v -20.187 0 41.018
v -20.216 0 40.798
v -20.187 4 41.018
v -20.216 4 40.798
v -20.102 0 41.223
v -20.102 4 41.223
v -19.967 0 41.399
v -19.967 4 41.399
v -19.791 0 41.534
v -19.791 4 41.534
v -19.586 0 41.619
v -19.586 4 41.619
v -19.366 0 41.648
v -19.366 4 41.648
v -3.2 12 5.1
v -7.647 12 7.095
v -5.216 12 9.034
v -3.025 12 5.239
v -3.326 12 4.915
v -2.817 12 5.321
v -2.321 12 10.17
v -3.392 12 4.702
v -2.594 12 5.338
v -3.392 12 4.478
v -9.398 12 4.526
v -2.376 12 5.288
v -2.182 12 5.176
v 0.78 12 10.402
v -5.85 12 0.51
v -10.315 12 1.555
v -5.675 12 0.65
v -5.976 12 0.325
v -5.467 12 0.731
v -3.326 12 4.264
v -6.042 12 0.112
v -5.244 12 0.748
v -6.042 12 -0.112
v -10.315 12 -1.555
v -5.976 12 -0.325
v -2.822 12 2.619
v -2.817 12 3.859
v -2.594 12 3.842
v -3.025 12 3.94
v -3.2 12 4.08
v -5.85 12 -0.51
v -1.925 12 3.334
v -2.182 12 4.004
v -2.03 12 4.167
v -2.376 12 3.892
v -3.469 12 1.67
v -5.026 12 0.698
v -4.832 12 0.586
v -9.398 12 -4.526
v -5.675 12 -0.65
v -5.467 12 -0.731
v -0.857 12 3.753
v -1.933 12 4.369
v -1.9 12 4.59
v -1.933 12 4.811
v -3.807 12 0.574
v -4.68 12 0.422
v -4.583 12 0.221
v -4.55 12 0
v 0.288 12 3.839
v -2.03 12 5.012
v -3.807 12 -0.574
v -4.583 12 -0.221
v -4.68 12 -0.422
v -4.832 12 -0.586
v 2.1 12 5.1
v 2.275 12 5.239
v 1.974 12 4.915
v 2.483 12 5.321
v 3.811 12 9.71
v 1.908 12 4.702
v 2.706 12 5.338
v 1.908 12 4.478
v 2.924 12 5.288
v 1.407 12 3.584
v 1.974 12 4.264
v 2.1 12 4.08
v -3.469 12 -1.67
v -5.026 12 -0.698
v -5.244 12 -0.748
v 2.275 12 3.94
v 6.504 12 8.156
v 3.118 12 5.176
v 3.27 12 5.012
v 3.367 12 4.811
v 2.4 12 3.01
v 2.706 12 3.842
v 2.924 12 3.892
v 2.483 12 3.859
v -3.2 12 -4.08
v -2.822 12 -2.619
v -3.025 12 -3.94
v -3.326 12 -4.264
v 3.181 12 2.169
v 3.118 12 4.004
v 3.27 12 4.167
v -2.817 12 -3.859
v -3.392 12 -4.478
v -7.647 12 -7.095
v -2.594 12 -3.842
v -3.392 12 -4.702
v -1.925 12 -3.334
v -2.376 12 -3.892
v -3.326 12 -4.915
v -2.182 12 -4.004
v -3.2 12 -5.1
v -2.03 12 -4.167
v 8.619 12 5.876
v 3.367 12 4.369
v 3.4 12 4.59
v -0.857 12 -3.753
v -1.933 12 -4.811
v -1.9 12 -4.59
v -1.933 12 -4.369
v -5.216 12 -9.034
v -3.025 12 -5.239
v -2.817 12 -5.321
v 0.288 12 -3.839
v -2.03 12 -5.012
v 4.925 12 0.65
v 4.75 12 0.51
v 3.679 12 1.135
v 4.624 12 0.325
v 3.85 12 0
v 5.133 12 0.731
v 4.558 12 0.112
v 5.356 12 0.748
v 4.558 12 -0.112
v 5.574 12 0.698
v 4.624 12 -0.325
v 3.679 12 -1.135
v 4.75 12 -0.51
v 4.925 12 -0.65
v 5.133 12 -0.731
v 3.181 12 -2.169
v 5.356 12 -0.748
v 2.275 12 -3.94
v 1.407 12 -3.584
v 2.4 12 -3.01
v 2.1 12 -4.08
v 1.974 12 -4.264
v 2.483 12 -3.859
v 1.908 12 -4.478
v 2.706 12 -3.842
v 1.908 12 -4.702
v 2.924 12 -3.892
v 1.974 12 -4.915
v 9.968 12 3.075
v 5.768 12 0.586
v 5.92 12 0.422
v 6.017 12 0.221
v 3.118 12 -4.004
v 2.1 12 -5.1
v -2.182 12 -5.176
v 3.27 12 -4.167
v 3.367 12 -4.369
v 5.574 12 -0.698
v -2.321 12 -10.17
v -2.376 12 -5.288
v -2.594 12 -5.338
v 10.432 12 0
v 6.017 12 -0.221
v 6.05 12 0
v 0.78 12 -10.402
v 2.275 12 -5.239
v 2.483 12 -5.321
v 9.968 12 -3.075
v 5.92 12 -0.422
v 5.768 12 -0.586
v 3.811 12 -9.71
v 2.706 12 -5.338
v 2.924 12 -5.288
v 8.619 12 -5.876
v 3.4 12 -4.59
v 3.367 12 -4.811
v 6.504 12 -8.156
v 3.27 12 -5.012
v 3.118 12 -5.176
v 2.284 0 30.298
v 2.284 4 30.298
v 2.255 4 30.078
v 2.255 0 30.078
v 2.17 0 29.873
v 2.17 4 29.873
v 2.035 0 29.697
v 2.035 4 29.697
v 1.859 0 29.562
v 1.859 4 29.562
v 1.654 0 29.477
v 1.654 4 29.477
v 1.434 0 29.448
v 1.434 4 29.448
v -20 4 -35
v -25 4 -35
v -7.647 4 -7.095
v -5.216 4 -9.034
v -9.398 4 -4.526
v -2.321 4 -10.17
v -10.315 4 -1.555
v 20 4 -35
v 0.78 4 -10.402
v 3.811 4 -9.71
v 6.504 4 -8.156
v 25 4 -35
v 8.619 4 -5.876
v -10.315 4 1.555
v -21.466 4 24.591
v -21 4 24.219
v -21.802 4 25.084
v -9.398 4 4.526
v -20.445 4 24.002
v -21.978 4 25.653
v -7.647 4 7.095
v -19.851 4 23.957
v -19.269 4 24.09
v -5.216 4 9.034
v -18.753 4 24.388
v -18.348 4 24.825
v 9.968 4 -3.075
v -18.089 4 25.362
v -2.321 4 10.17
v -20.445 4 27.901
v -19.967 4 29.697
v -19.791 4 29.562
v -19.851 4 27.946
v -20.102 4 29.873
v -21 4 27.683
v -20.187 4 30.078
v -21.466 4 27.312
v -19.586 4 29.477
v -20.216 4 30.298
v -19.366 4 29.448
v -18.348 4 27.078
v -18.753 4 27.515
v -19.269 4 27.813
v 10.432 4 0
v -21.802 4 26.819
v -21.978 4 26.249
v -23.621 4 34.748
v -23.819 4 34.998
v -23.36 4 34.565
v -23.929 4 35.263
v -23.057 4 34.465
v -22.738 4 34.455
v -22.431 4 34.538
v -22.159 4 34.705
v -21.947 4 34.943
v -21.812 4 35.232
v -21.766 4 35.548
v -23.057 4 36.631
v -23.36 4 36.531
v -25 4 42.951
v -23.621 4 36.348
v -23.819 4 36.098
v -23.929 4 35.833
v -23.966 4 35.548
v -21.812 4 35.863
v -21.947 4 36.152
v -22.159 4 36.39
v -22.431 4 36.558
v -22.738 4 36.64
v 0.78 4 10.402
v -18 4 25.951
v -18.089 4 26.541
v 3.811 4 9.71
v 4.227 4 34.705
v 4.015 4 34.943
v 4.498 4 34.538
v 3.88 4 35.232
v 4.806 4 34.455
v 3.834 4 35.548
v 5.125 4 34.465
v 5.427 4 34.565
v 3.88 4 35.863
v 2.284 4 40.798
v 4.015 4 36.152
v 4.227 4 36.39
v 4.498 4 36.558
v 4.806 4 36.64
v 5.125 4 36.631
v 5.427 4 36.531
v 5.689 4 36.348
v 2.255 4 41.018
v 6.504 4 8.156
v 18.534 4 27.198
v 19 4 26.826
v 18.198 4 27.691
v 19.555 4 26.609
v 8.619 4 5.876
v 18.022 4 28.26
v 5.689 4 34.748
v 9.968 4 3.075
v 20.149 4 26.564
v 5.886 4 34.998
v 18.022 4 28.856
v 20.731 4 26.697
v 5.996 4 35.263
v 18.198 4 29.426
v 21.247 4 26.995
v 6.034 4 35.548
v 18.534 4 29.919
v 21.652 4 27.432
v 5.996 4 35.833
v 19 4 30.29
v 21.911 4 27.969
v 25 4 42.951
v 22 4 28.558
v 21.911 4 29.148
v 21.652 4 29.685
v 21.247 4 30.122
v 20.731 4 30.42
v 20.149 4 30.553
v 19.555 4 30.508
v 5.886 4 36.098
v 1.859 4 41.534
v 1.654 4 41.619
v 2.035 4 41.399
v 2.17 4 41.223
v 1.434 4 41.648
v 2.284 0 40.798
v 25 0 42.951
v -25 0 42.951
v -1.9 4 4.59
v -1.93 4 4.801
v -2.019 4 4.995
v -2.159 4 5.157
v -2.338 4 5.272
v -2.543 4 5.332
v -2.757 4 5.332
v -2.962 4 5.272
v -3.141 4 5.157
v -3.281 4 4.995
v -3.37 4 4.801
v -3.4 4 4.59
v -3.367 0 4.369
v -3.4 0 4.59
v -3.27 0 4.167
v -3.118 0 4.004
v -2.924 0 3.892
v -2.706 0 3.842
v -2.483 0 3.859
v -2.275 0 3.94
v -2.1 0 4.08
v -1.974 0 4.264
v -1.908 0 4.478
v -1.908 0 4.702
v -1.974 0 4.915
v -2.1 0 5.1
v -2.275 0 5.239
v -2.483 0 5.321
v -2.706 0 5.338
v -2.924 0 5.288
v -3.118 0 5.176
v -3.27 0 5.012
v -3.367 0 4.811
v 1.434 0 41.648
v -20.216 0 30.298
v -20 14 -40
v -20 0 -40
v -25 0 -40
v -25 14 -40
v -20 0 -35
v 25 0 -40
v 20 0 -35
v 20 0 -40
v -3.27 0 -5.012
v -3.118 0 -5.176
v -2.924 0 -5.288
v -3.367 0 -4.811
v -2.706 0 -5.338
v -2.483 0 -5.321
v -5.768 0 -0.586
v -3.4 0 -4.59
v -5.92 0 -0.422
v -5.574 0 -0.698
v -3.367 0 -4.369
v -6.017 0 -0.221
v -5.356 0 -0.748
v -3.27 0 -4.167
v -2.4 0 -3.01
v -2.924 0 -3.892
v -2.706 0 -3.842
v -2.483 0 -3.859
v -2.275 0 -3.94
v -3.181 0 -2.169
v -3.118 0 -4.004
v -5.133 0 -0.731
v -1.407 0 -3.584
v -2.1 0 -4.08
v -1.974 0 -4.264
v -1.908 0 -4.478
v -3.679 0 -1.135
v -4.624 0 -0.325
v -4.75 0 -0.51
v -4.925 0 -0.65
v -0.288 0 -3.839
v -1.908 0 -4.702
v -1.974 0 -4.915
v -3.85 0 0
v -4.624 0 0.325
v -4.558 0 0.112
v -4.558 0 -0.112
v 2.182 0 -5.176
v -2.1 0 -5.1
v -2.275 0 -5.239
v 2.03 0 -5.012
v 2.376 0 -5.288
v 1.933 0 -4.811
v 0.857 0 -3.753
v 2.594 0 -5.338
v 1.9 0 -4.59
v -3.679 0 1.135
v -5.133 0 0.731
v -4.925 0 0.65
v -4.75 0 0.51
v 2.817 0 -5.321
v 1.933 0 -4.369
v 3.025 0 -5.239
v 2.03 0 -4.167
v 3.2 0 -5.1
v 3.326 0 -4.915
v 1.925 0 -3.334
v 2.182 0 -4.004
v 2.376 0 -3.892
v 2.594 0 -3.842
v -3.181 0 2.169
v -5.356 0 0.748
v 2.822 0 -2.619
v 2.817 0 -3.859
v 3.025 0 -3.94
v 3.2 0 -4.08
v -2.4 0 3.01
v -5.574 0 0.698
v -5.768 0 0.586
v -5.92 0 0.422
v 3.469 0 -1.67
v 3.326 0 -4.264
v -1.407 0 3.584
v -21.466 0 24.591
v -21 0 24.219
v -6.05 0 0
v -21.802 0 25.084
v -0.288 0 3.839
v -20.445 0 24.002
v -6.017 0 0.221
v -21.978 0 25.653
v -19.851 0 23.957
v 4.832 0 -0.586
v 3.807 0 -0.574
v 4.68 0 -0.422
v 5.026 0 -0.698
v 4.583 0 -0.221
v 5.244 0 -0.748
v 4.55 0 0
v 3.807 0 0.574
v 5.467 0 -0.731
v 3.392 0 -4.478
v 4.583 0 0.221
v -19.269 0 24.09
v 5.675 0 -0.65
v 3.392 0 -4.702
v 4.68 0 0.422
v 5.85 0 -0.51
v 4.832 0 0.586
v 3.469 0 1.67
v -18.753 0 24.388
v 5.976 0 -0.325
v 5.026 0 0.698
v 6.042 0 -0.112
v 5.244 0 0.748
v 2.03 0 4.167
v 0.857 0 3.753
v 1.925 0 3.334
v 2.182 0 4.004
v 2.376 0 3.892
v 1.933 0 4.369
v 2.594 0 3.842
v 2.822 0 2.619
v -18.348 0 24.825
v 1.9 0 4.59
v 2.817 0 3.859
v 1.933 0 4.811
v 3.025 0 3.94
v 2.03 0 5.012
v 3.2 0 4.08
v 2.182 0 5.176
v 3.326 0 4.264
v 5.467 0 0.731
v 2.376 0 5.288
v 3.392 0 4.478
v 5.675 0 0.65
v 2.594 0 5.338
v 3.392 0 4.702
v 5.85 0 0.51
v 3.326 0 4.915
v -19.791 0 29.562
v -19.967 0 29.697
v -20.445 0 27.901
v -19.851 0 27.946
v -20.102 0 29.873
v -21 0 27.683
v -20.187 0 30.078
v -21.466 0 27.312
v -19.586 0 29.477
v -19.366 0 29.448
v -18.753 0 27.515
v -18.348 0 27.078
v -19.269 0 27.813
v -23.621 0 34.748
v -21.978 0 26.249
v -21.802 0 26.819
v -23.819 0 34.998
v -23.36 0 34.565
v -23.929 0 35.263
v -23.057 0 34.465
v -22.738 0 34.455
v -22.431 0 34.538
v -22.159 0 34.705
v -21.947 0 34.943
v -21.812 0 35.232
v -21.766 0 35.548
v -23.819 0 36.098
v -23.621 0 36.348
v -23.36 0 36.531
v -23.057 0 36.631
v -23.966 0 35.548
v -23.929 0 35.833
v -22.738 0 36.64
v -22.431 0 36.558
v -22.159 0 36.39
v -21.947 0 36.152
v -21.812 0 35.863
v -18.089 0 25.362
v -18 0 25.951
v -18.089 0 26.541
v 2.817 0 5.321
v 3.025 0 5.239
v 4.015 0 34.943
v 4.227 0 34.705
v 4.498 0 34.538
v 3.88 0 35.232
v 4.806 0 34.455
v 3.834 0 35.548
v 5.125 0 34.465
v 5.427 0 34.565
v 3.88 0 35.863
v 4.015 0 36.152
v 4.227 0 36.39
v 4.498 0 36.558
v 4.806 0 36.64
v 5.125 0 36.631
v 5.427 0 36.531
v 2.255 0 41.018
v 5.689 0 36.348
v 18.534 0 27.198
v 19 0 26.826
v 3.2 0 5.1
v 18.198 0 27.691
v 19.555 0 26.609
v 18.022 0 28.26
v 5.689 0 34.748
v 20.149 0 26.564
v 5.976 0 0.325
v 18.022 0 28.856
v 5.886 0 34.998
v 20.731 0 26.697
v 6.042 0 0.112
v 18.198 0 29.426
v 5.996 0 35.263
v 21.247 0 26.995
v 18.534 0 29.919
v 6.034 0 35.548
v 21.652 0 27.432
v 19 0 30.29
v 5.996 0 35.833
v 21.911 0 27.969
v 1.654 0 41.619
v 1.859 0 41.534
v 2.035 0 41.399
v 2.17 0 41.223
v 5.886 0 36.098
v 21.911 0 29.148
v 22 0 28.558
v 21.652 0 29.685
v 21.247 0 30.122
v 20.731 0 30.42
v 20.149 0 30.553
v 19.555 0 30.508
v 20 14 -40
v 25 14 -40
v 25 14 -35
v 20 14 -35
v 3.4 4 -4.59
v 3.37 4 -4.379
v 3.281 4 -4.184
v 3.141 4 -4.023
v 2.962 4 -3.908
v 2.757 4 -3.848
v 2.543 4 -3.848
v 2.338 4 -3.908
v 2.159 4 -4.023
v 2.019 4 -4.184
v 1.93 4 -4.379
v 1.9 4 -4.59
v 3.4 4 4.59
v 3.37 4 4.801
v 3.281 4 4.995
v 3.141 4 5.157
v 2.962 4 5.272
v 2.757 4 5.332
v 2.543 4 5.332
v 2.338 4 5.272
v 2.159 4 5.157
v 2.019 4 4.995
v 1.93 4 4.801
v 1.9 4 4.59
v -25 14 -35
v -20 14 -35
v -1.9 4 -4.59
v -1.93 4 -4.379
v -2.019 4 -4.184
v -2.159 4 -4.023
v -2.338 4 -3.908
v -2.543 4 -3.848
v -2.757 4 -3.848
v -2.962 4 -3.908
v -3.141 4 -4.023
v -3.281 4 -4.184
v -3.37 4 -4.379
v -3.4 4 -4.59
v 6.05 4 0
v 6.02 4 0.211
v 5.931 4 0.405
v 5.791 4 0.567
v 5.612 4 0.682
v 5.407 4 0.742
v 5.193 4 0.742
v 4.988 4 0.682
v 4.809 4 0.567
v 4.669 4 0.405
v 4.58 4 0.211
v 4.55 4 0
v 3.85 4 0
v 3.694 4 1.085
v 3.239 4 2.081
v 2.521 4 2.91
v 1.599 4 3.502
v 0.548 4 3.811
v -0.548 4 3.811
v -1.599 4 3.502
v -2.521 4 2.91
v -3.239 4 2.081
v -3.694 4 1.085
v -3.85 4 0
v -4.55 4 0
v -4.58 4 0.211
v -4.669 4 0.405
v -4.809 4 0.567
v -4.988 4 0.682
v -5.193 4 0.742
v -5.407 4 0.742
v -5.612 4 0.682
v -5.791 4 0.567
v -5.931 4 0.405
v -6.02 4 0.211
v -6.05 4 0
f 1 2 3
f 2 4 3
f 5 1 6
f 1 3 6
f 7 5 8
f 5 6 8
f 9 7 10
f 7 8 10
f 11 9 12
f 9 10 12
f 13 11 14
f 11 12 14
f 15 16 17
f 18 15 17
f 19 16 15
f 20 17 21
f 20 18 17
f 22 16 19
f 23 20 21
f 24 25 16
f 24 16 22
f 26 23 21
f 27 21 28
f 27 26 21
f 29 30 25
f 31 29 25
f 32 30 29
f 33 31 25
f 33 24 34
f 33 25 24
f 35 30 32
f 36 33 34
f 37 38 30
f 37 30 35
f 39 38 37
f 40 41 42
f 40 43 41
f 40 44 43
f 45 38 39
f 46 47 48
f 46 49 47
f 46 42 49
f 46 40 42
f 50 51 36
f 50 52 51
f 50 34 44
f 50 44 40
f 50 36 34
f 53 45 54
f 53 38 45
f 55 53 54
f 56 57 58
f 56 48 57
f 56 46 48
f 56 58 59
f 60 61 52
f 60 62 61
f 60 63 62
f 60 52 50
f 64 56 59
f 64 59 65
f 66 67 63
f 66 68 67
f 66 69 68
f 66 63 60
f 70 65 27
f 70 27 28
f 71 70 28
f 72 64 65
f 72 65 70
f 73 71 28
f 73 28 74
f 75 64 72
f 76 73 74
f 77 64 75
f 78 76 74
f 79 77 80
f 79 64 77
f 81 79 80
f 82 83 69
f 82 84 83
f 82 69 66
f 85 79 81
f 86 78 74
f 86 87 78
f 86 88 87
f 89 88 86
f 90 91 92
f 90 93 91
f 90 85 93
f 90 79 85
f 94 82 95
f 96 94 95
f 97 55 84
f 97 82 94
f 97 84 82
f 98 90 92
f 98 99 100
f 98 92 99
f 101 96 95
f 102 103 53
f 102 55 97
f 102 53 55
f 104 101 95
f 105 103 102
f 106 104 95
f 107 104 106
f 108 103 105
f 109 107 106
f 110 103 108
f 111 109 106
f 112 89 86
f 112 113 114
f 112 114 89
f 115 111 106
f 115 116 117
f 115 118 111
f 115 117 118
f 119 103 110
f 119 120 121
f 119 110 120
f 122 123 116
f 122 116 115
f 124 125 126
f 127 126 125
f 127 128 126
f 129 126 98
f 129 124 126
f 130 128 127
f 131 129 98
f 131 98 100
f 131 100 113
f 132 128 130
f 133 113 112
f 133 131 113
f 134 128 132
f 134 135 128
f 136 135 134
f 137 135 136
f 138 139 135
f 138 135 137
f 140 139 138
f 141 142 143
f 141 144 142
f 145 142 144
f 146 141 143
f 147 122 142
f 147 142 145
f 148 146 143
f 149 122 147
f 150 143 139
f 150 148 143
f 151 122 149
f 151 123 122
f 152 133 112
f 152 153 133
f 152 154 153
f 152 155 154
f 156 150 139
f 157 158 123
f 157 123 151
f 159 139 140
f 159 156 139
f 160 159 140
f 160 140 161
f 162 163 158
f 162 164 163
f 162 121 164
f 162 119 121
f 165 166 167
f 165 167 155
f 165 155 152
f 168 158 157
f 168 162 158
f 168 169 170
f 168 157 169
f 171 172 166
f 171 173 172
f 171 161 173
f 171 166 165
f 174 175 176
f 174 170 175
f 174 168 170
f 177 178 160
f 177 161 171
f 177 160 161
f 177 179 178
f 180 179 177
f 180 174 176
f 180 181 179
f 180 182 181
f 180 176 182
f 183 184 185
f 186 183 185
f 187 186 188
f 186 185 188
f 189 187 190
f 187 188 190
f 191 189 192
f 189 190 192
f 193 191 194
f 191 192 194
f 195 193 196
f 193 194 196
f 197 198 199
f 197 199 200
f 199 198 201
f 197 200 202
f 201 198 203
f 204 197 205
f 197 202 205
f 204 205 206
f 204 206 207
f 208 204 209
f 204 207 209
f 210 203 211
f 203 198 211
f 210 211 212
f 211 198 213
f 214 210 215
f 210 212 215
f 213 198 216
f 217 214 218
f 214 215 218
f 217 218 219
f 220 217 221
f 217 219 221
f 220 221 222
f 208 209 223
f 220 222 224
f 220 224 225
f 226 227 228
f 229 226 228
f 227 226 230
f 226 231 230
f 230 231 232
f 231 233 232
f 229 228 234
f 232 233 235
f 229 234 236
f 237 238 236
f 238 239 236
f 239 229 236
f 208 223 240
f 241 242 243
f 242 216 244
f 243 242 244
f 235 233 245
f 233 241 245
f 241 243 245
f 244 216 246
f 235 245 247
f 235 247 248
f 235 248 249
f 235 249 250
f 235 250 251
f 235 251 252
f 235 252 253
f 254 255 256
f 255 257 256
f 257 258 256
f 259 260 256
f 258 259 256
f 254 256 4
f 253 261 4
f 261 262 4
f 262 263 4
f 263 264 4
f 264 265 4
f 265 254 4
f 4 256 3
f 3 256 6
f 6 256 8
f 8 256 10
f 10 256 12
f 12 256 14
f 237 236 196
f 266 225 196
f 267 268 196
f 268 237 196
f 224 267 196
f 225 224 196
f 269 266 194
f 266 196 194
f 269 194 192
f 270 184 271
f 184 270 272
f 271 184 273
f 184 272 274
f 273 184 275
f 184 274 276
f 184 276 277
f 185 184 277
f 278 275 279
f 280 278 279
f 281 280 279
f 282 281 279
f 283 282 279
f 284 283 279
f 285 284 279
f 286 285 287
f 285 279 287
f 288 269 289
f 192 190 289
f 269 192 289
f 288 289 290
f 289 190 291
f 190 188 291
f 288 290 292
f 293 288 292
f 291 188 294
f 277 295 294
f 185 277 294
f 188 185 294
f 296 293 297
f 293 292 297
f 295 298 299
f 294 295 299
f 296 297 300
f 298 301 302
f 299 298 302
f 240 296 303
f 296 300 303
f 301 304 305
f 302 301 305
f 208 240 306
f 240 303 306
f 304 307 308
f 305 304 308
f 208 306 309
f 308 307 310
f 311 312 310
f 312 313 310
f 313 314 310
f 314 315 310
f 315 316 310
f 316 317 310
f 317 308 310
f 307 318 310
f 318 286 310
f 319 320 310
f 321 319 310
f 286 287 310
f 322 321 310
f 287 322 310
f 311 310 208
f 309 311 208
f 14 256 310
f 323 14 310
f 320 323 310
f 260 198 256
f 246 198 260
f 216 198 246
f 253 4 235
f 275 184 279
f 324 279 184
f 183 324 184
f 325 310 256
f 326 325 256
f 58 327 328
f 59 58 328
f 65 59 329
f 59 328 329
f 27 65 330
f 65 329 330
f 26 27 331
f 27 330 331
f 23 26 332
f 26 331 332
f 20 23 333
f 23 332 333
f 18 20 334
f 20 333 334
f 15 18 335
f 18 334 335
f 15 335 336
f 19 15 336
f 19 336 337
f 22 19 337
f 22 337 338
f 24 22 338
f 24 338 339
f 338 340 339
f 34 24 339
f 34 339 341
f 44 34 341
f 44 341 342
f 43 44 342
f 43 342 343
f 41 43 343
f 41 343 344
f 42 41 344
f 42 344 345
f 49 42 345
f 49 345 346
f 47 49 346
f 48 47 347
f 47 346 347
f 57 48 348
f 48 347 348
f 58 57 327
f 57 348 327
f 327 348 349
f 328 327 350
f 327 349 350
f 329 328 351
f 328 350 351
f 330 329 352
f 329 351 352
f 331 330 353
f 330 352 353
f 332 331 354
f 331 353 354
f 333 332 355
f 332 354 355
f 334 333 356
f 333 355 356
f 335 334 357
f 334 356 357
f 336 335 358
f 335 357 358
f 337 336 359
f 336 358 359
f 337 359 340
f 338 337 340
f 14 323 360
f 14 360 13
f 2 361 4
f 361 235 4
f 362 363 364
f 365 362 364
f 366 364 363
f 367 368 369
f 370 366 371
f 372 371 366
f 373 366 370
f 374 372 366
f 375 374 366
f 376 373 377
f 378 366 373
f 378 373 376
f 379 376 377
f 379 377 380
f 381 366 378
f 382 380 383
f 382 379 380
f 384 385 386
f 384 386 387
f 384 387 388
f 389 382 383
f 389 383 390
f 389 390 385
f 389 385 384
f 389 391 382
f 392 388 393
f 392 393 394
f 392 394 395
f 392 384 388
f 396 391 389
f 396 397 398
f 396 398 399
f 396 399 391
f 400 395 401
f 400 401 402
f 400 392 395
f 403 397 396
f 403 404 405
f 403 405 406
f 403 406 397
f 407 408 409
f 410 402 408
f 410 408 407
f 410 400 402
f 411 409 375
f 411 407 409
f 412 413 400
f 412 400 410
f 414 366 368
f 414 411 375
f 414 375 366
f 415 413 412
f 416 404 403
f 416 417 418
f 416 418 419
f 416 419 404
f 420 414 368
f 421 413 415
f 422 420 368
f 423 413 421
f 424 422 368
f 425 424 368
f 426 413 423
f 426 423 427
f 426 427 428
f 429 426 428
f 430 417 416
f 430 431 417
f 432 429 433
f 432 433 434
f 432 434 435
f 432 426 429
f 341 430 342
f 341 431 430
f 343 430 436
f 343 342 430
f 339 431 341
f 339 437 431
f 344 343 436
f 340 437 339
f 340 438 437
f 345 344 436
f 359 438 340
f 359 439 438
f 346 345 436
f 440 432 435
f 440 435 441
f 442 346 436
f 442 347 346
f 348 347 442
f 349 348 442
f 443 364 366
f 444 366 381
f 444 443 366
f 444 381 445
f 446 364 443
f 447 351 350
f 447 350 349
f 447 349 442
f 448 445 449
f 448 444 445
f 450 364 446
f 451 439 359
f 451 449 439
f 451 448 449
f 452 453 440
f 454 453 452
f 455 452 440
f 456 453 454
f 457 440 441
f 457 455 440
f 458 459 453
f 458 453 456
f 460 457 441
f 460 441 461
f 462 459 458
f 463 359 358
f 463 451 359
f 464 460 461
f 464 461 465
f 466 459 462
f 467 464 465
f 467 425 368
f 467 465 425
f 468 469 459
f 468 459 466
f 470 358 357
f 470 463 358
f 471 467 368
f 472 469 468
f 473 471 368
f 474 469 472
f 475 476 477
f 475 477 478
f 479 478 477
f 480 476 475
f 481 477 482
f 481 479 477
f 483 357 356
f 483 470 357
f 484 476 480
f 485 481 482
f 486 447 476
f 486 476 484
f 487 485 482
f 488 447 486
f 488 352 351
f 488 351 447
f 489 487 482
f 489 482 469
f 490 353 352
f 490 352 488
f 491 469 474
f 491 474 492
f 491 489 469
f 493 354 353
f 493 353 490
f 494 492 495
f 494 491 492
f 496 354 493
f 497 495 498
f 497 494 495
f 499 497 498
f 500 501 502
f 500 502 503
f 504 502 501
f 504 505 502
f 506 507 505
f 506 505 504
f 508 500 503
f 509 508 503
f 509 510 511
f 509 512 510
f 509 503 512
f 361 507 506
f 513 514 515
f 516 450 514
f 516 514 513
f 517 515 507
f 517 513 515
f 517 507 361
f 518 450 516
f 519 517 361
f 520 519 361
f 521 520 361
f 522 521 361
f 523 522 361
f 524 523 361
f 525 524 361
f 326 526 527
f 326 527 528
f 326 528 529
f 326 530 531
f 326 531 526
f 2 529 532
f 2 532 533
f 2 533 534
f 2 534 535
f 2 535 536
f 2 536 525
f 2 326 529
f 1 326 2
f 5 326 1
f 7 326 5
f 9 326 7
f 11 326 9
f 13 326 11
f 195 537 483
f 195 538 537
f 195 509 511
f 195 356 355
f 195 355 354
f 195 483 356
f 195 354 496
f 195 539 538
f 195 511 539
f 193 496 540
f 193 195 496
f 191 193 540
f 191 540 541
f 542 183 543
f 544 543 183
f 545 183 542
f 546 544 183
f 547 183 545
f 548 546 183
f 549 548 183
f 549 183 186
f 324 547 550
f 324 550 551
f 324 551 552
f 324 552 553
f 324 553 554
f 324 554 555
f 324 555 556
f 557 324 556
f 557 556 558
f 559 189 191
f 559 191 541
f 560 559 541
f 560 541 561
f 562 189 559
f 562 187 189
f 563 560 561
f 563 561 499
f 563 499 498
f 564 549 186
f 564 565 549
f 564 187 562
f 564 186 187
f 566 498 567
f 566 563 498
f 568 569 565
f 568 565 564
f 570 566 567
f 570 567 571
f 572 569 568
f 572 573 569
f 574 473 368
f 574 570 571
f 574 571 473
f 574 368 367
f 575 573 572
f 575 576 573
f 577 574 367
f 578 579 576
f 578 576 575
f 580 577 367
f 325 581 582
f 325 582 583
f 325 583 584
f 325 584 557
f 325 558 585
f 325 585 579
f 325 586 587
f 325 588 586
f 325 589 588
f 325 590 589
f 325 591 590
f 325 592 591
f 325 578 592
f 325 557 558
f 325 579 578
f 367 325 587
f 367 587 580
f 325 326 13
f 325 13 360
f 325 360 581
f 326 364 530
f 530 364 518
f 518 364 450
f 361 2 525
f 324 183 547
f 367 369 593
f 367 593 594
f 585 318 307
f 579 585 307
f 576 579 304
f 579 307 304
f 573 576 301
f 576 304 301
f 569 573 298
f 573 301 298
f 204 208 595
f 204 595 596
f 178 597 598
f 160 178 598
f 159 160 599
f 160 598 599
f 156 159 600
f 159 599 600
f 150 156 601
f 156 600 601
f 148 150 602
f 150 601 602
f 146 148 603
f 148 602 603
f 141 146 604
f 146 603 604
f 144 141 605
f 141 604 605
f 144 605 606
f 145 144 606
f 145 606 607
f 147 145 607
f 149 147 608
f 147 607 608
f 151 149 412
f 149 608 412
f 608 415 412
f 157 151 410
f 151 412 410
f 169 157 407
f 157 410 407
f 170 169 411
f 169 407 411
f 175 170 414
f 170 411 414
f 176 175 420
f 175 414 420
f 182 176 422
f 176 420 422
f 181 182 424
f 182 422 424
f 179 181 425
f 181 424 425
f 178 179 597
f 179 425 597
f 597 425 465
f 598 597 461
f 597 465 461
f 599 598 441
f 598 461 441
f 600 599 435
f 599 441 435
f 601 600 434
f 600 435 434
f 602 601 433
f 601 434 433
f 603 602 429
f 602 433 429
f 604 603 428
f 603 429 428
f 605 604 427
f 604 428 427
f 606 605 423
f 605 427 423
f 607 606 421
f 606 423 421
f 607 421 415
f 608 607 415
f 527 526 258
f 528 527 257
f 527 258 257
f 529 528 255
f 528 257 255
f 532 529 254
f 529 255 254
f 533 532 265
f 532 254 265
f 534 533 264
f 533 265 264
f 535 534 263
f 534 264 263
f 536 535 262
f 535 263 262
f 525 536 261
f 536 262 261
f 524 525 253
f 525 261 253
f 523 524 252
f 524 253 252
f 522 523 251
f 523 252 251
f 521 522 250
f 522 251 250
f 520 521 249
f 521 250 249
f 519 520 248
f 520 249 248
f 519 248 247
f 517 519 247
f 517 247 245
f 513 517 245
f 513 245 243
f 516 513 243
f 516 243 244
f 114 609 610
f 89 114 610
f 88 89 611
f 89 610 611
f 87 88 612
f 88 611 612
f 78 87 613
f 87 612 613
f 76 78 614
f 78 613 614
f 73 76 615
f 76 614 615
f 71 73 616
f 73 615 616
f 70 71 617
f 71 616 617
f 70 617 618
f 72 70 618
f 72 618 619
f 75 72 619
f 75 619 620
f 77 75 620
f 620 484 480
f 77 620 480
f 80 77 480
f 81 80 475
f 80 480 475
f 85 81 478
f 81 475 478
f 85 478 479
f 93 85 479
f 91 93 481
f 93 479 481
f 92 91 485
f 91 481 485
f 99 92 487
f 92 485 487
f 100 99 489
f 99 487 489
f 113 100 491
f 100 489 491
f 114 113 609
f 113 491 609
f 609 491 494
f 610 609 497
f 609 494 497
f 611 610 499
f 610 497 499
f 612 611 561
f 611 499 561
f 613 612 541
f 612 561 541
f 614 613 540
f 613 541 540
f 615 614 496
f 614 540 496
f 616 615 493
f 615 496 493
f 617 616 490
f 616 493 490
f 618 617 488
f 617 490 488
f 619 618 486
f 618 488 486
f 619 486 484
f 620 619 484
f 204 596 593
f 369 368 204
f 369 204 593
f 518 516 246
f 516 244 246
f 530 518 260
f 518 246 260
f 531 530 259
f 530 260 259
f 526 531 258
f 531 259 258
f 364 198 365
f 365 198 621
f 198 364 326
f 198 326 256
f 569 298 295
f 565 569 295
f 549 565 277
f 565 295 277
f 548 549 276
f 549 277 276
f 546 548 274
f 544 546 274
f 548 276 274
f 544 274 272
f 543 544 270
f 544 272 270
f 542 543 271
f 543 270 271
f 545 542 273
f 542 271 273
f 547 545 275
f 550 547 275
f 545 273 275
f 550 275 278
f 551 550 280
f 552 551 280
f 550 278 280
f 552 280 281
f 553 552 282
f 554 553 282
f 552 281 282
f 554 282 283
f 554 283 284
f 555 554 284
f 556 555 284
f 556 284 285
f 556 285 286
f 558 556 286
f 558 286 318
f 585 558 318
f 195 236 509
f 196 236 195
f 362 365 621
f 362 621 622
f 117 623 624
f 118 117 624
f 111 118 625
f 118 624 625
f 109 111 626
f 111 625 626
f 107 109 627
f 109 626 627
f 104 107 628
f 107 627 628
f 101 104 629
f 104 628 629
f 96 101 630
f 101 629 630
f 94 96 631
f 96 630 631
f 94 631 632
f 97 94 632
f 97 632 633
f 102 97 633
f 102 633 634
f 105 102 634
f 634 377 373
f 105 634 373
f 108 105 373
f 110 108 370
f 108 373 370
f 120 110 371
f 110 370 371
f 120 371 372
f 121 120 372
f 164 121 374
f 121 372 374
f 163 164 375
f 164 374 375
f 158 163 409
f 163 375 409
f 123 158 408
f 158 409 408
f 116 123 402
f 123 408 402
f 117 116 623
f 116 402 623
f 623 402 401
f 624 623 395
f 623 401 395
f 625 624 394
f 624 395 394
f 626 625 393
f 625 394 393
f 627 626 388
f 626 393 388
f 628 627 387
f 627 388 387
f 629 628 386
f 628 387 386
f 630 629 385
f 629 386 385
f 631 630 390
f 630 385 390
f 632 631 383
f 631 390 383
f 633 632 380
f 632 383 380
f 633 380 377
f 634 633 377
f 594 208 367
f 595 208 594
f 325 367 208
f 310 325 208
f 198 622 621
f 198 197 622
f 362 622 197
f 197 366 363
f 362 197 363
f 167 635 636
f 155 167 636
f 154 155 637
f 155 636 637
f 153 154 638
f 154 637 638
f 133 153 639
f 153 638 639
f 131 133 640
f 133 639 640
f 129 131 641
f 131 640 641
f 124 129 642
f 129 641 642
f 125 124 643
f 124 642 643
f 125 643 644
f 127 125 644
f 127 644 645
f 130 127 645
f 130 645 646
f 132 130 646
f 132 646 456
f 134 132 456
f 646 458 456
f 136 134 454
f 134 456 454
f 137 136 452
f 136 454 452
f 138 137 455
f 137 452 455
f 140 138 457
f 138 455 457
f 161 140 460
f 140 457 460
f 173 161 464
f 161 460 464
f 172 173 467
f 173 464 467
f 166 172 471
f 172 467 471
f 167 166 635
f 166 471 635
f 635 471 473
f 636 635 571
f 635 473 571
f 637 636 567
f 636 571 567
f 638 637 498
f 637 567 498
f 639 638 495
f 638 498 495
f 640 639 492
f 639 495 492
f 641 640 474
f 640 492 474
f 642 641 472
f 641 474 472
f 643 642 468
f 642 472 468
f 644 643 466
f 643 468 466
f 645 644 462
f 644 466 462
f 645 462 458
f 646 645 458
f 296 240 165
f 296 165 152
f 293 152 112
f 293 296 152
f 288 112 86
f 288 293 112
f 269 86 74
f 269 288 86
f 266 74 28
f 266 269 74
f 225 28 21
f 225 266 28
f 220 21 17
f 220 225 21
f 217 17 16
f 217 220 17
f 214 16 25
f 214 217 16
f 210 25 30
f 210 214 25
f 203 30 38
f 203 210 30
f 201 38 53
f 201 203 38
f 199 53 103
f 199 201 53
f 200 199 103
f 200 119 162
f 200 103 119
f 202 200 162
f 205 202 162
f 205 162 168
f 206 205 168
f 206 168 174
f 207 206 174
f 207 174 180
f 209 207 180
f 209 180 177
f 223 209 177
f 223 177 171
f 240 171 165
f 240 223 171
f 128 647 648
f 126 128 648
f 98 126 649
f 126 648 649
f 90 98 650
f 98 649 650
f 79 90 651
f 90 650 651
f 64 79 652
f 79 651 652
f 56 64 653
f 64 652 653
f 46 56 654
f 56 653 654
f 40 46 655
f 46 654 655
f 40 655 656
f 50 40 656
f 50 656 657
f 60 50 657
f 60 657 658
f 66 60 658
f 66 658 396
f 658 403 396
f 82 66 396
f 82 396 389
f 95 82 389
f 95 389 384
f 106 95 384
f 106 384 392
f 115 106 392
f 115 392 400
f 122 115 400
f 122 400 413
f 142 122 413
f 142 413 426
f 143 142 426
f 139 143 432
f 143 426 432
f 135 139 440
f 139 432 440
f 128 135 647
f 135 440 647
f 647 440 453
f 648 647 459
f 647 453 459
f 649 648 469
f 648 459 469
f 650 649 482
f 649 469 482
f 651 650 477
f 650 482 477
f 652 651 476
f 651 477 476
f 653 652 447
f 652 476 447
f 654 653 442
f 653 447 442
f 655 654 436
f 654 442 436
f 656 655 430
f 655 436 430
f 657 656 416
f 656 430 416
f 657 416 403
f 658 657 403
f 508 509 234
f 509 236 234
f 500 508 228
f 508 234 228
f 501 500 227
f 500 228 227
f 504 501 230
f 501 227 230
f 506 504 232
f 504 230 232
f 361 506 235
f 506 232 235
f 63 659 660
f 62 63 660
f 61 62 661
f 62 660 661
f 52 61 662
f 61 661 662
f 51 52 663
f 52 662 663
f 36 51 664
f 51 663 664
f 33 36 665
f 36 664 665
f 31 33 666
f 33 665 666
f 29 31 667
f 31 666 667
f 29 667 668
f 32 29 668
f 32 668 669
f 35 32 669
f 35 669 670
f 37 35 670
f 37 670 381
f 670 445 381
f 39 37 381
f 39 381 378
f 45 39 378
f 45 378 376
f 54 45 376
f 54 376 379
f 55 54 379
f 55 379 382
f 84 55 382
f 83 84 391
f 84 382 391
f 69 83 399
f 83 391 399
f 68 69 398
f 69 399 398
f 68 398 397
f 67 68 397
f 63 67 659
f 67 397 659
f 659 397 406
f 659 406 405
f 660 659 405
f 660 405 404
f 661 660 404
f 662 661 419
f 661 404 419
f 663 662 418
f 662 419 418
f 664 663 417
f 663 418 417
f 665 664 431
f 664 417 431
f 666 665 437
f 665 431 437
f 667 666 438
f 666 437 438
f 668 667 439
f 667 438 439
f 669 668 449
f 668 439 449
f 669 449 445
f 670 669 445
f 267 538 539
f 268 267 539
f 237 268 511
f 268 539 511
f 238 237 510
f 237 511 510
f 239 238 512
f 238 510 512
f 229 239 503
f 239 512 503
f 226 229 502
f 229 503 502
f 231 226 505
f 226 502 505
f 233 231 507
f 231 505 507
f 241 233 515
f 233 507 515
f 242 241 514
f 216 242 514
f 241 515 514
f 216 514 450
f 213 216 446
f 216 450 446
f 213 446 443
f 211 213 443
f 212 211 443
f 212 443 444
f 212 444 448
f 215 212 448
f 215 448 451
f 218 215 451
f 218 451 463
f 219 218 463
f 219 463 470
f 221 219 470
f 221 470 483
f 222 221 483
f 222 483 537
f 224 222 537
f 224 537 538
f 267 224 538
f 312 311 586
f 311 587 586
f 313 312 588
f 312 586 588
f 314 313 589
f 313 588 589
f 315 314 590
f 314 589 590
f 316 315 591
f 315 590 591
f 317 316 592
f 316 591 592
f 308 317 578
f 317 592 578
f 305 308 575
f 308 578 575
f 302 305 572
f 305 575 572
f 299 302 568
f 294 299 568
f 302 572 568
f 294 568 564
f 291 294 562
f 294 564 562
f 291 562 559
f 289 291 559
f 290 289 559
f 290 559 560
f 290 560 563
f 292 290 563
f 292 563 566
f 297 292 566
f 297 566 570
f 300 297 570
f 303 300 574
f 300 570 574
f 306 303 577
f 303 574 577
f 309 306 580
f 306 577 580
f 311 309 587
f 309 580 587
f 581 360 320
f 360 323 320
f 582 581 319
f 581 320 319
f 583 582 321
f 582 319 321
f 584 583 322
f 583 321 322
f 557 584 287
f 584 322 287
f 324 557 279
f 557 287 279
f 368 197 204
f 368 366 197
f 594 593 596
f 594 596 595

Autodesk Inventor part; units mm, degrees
ref_plane "YZ Plane" through (0, 0, 0) normal (1, 0, 0) x (0, 1, 0)
ref_plane "XZ Plane" through (0, 0, 0) normal (0, 1, 0) x (-1, 0, 0)
ref_plane "XY Plane" through (0, 0, 0) normal (0, 0, 1) x (1, 0, 0)
sketch "Эскиз1" plane through (0, 0, 0) normal (0, 1, 0) x (-1, 0, 0)
  circle A0 centre (-2.65, -4.5899) radius 0.75
  circle A1 centre (2.65, -4.5899) radius 0.75
  circle A2 centre (5.3, 0) radius 0.75
  circle A3 centre (2.65, 4.5899) radius 0.75
  circle A4 centre (-2.65, 4.5899) radius 0.75
  circle A5 centre (-5.3, 0) radius 0.75
  circle A6 centre (0, 0) radius 3.85
  arc A7 (-3.4059, 8.2225) -> (-3.1756, 6.1003) centre (3.6513, 7.9146) ccw
  arc A8 (-3.1756, 6.1003) -> (-3.6952, 5.8003) centre (0, 0) ccw
  arc A9 (-3.6952, 5.8003) -> (-5.418, 7.0608) centre (-8.6799, 0.7952) ccw
  arc A10 (-5.418, 7.0608) -> (-6.0128, 6.5618) centre (0, 0) ccw
  arc A11 (-6.0128, 6.5618) -> (-5.0705, 4.6463) centre (0.7241, 8.6861) ccw
  arc A12 (-5.0705, 4.6463) -> (-5.4562, 4.1867) centre (0, 0) ccw
  arc A13 (-5.4562, 4.1867) -> (-7.5062, 4.782) centre (-8.4284, -2.2214) ccw
  arc A14 (-7.5062, 4.782) -> (-7.8944, 4.1096) centre (0, 0) ccw
  arc A15 (-7.8944, 4.1096) -> (-6.3539, 2.6319) centre (-2.2904, 8.4099) ccw
  arc A16 (-6.3539, 2.6319) -> (-6.5591, 2.0681) centre (0, 0) ccw
  arc A17 (-6.5591, 2.0681) -> (-8.689, 1.9263) centre (-7.1604, -4.9702) ccw
  arc A18 (-8.689, 1.9263) -> (-8.8239, 1.1617) centre (0, 0) ccw
  arc A19 (-8.8239, 1.1617) -> (-6.8708, 0.3) centre (-5.0286, 7.1194) ccw
  arc A20 (-6.8708, 0.3) -> (-6.8708, -0.3) centre (0, 0) ccw
  arc A21 (-6.8708, -0.3) -> (-8.8239, -1.1617) centre (-5.0286, -7.1194) ccw
  arc A22 (-8.8239, -1.1617) -> (-8.689, -1.9263) centre (0, 0) ccw
  arc A23 (-8.689, -1.9263) -> (-6.5591, -2.0681) centre (-7.1604, 4.9702) ccw
  arc A24 (-6.5591, -2.0681) -> (-6.3539, -2.6319) centre (0, 0) ccw
  arc A25 (-6.3539, -2.6319) -> (-7.8944, -4.1096) centre (-2.2904, -8.4099) ccw
  arc A26 (-7.8944, -4.1096) -> (-7.5062, -4.782) centre (0, 0) ccw
  arc A27 (-7.5062, -4.782) -> (-5.4562, -4.1867) centre (-8.4284, 2.2214) ccw
  arc A28 (-5.4562, -4.1867) -> (-5.0705, -4.6463) centre (0, 0) ccw
  arc A29 (-5.0705, -4.6463) -> (-6.0128, -6.5618) centre (0.7241, -8.6861) ccw
  arc A30 (-6.0128, -6.5618) -> (-5.418, -7.0608) centre (0, 0) ccw
  arc A31 (-5.418, -7.0608) -> (-3.6952, -5.8003) centre (-8.6799, -0.7952) ccw
  arc A32 (-3.6952, -5.8003) -> (-3.1756, -6.1003) centre (0, 0) ccw
  arc A33 (-3.1756, -6.1003) -> (-3.4059, -8.2225) centre (3.6513, -7.9146) ccw
  arc A34 (-3.4059, -8.2225) -> (-2.6763, -8.4881) centre (0, 0) ccw
  arc A35 (-2.6763, -8.4881) -> (-1.4885, -6.7144) centre (-7.8845, -3.716) ccw
  arc A36 (-1.4885, -6.7144) -> (-0.8977, -6.8185) centre (0, 0) ccw
  arc A37 (-0.8977, -6.8185) -> (-0.3882, -8.8915) centre (6.138, -6.1885) ccw
  arc A38 (-0.3882, -8.8915) -> (0.3882, -8.8915) centre (0, 0) ccw
  arc A39 (0.3882, -8.8915) -> (0.8977, -6.8185) centre (-6.138, -6.1885) ccw
  arc A40 (0.8977, -6.8185) -> (1.4885, -6.7144) centre (0, 0) ccw
  arc A41 (1.4885, -6.7144) -> (2.6763, -8.4881) centre (7.8845, -3.716) ccw
  arc A42 (2.6763, -8.4881) -> (3.4059, -8.2225) centre (0, 0) ccw
  arc A43 (3.4059, -8.2225) -> (3.1756, -6.1003) centre (-3.6513, -7.9146) ccw
  arc A44 (3.1756, -6.1003) -> (3.6952, -5.8003) centre (0, 0) ccw
  arc A45 (3.6952, -5.8003) -> (5.418, -7.0608) centre (8.6799, -0.7952) ccw
  arc A46 (5.418, -7.0608) -> (6.0128, -6.5618) centre (0, 0) ccw
  arc A47 (6.0128, -6.5618) -> (5.0705, -4.6463) centre (-0.7241, -8.6861) ccw
  arc A48 (5.0705, -4.6463) -> (5.4562, -4.1867) centre (0, 0) ccw
  arc A49 (5.4562, -4.1867) -> (7.5062, -4.782) centre (8.4284, 2.2214) ccw
  arc A50 (7.5062, -4.782) -> (7.8944, -4.1096) centre (0, 0) ccw
  arc A51 (7.8944, -4.1096) -> (6.3539, -2.6319) centre (2.2904, -8.4099) ccw
  arc A52 (6.3539, -2.6319) -> (6.5591, -2.0681) centre (0, 0) ccw
  arc A53 (6.5591, -2.0681) -> (8.689, -1.9263) centre (7.1604, 4.9702) ccw
  arc A54 (8.689, -1.9263) -> (8.8239, -1.1617) centre (0, 0) ccw
  arc A55 (8.8239, -1.1617) -> (6.8708, -0.3) centre (5.0286, -7.1194) ccw
  arc A56 (6.8708, -0.3) -> (6.8708, 0.3) centre (0, 0) ccw
  arc A57 (6.8708, 0.3) -> (8.8239, 1.1617) centre (5.0286, 7.1194) ccw
  arc A58 (8.8239, 1.1617) -> (8.689, 1.9263) centre (0, 0) ccw
  arc A59 (8.689, 1.9263) -> (6.5591, 2.0681) centre (7.1604, -4.9702) ccw
  arc A60 (6.5591, 2.0681) -> (6.3539, 2.6319) centre (0, 0) ccw
  arc A61 (6.3539, 2.6319) -> (7.8944, 4.1096) centre (2.2904, 8.4099) ccw
  arc A62 (7.8944, 4.1096) -> (7.5062, 4.782) centre (0, 0) ccw
  arc A63 (7.5062, 4.782) -> (5.4562, 4.1867) centre (8.4284, -2.2214) ccw
  arc A64 (5.4562, 4.1867) -> (5.0705, 4.6463) centre (0, 0) ccw
  arc A65 (5.0705, 4.6463) -> (6.0128, 6.5618) centre (-0.7241, 8.6861) ccw
  arc A66 (6.0128, 6.5618) -> (5.418, 7.0608) centre (0, 0) ccw
  arc A67 (5.418, 7.0608) -> (3.6952, 5.8003) centre (8.6799, 0.7952) ccw
  arc A68 (3.6952, 5.8003) -> (3.1756, 6.1003) centre (0, 0) ccw
  arc A69 (3.1756, 6.1003) -> (3.4059, 8.2225) centre (-3.6513, 7.9146) ccw
  arc A70 (3.4059, 8.2225) -> (2.6763, 8.4881) centre (0, 0) ccw
  arc A71 (2.6763, 8.4881) -> (1.4885, 6.7144) centre (7.8845, 3.716) ccw
  arc A72 (1.4885, 6.7144) -> (0.8977, 6.8185) centre (0, 0) ccw
  arc A73 (0.8977, 6.8185) -> (0.3882, 8.8915) centre (-6.138, 6.1885) ccw
  arc A74 (0.3882, 8.8915) -> (-0.3882, 8.8915) centre (0, 0) ccw
  arc A75 (-0.3882, 8.8915) -> (-0.8977, 6.8185) centre (6.138, 6.1885) ccw
  arc A76 (-0.8977, 6.8185) -> (-1.4885, 6.7144) centre (0, 0) ccw
  arc A77 (-1.4885, 6.7144) -> (-2.6763, 8.4881) centre (-7.8845, 3.716) ccw
  arc A78 (-2.6763, 8.4881) -> (-3.4059, 8.2225) centre (0, 0) ccw
  line L0 (-25, 25) -> (25, 25)
  line L1 (25, 25) -> (25, -25)
  line L2 (25, -25) -> (-25, -25)
  line L3 (-25, -25) -> (-25, 25)
  line L4 (-25, 25) -> (25, -25) construction
  line L5 (25, 25) -> (-25, -25) construction
  dimension "d4" = 50
  dimension "d5" = 50
extrude "Выдавливание1" add sketch "Эскиз1" along normal blind 4 contours A78 A77 A76 A75 A74 A73 A72 A71 A70 A69 A68 A67 A66 A65 A64 A63 A62 A61 A60 A59 A58 A57 A56 A55 A54 A53 A52 A51 A50 A49 A48 A47 A46 A45 A44 A43 A42 A41 A40 A39 A38 A37 A36 A35 A34 A33 A32 A31 A30 A29 A28 A27 A26 A25 A24 A23 A22 A21 A20 A19 A18 A17 A16 A15 A14 A13 A12 A11 A10 A9 A8 A7 | L0 L1 L2 L3
sketch "Эскиз2" plane through (0, 4, 0) normal (0, 1, 0) x (1, 0, 0)
  line L0 (-8.6363, -32.6478) -> (-8.5162, -32.6478)
  arc A0 (-8.5162, -38.4478) -> (-8.5162, -32.6478) centre (-8.5162, -35.5478) ccw
  line L1 (-8.5162, -38.4478) -> (-8.6363, -38.4478)
  arc A1 (-12.5542, -41.5478) -> (-8.6363, -38.4478) centre (-14.1162, -35.5478) ccw
  line L2 (-12.5542, -41.5478) -> (1.4338, -41.5478)
  arc A2 (1.4338, -41.5478) -> (2.1838, -40.7978) centre (1.4338, -40.7978) ccw
  line L3 (2.1838, -40.7978) -> (2.1838, -30.2978)
  arc A3 (2.1838, -30.2978) -> (1.4338, -29.5478) centre (1.4338, -30.2978) ccw
  line L4 (1.4338, -29.5478) -> (-12.5542, -29.5478)
  arc A4 (-8.6363, -32.6478) -> (-12.5542, -29.5478) centre (-14.1162, -35.5478) ccw
  line L5 (-4.2162, -40.6478) -> (0.7838, -40.6478)
  arc A5 (-4.7162, -40.1478) -> (-4.2162, -40.6478) centre (-4.2162, -40.1478) ccw
  line L6 (-4.7162, -30.9478) -> (-4.7162, -40.1478)
  arc A6 (-4.2162, -30.4478) -> (-4.7162, -30.9478) centre (-4.2162, -30.9478) ccw
  line L7 (0.7838, -30.4478) -> (-4.2162, -30.4478)
  arc A7 (1.2838, -30.9478) -> (0.7838, -30.4478) centre (0.7838, -30.9478) ccw
  line L8 (1.2838, -40.1478) -> (1.2838, -30.9478)
  arc A8 (0.7838, -40.6478) -> (1.2838, -40.1478) centre (0.7838, -40.1478) ccw
  arc A9 (5.8864, -34.9978) -> (5.8864, -36.0978) centre (4.9338, -35.5478) ccw
  line L9 (7.0838, -34.9978) -> (5.8864, -34.9978)
  line L10 (7.0838, -34.9978) -> (7.0838, -30.2978)
  arc A10 (7.0838, -30.2978) -> (6.2338, -29.4478) centre (6.2338, -30.2978) ccw
  line L11 (6.2338, -29.4478) -> (1.4338, -29.4478)
  arc A11 (2.2838, -30.2978) -> (1.4338, -29.4478) centre (1.4338, -30.2978) ccw
  line L12 (2.2838, -40.7978) -> (2.2838, -30.2978)
  arc A12 (1.4338, -41.6478) -> (2.2838, -40.7978) centre (1.4338, -40.7978) ccw
  line L13 (1.4338, -41.6478) -> (6.2338, -41.6478)
  arc A13 (6.2338, -41.6478) -> (7.0838, -40.7978) centre (6.2338, -40.7978) ccw
  line L14 (7.0838, -40.7978) -> (7.0838, -36.0978)
  line L15 (5.8864, -36.0978) -> (7.0838, -36.0978)
  line L16 (-25.0162, -30.2978) -> (-25.0162, -34.9978)
  line L17 (-23.8188, -34.9978) -> (-25.0162, -34.9978)
  arc A14 (-23.8188, -36.0978) -> (-23.8188, -34.9978) centre (-22.8662, -35.5478) ccw
  line L18 (-25.0162, -36.0978) -> (-23.8188, -36.0978)
  line L19 (-25.0162, -36.0978) -> (-25.0162, -40.7978)
  arc A15 (-25.0162, -40.7978) -> (-24.1662, -41.6478) centre (-24.1662, -40.7978) ccw
  line L20 (-24.1662, -41.6478) -> (-19.3662, -41.6478)
  arc A16 (-20.2162, -40.7978) -> (-19.3662, -41.6478) centre (-19.3662, -40.7978) ccw
  line L21 (-20.2162, -30.2978) -> (-20.2162, -40.7978)
  arc A17 (-19.3662, -29.4478) -> (-20.2162, -30.2978) centre (-19.3662, -30.2978) ccw
  line L22 (-19.3662, -29.4478) -> (-24.1662, -29.4478)
  arc A18 (-24.1662, -29.4478) -> (-25.0162, -30.2978) centre (-24.1662, -30.2978) ccw
  line L23 (-19.3662, -29.4478) -> (-15.6783, -29.4478)
  line L24 (-12.5542, -29.4478) -> (-14.1162, -29.4478)
  line L25 (-14.1162, -29.4478) -> (-15.6783, -29.4478)
  line L26 (-12.5542, -29.4478) -> (1.4338, -29.4478)
  line L27 (1.4338, -41.6478) -> (-12.5542, -41.6478)
  line L28 (-15.6783, -41.6478) -> (-19.3662, -41.6478)
  line L29 (-15.6783, -41.6478) -> (-14.1162, -41.6478)
  line L30 (-14.1162, -41.6478) -> (-12.5542, -41.6478)
  arc A19 (-15.6783, -29.5478) -> (-20.1162, -33.9857) centre (-14.1162, -35.5478) ccw
  line L31 (-15.6783, -29.5478) -> (-19.3662, -29.5478)
  arc A20 (-19.3662, -29.5478) -> (-20.1162, -30.2978) centre (-19.3662, -30.2978) ccw
  line L32 (-20.1162, -30.2978) -> (-20.1162, -33.9857)
  line L33 (-19.3662, -41.5478) -> (-15.6783, -41.5478)
  arc A21 (-20.1162, -37.1098) -> (-15.6783, -41.5478) centre (-14.1162, -35.5478) ccw
  line L34 (-20.1162, -37.1098) -> (-20.1162, -40.7978)
  arc A22 (-20.1162, -40.7978) -> (-19.3662, -41.5478) centre (-19.3662, -40.7978) ccw
  circle A23 centre (4.9338, -35.5478) radius 1.1
  line L35 (5.8864, -34.9978) -> (7.0838, -34.9978)
  line L36 (7.0838, -36.0978) -> (7.0838, -34.9978)
  circle A24 centre (-22.8662, -35.5478) radius 1.1
  line L37 (-25.0162, -34.9978) -> (-23.8188, -34.9978)
  line L38 (-25.0162, -36.0978) -> (-25.0162, -34.9978)
  circle A25 centre (-14.1162, -35.5478) radius 0.8
  line L39 (-25, -25) -> (-25, 25) projected
  line L40 (25, -42.9514) -> (-25, -42.9514)
  line L41 (-25, -42.9514) -> (-25, -25)
  line L42 (-25, -25) -> (25, -25)
  line L43 (25, -25) -> (25, -42.9514)
  line L44 (25, -25) -> (-25, -25) projected
  point P0 (0, 0)
  point P1 (-8.9662, -35.5478)
  dimension "d27" = 0
extrude "Выдавливание2" add sketch "Эскиз2" against normal blind 4 contours A9 L15 L14 A13 L13 A12 L12 A11 L11 A10 L10 L9 | L9 L36 L15 A23 | L10 A10 L11 L26 L24 L25 L23 L22 A18 L41 L42 L43 L40 A15 L20 L28 L29 L30 L27 L13 A13 L14 L36 | A17 L21 A16 L20 A15 L41 L18 A14 L17 A18 L22 | L17 A24 L18 L41
sketch "Эскиз3" plane through (0, 4, 0) normal (0, 1, 0) x (1, 0, 0)
  circle A0 centre (-2.65, -4.5899) radius 0.75
  circle A1 centre (2.65, -4.5899) radius 0.75
  circle A2 centre (5.3, 0) radius 0.75
  circle A3 centre (2.65, 4.5899) radius 0.75
  circle A4 centre (-2.65, 4.5899) radius 0.75
  circle A5 centre (-5.3, 0) radius 0.75
  circle A6 centre (0, 0) radius 3.85
  arc A7 (-3.4059, 8.2225) -> (-3.1756, 6.1003) centre (3.6513, 7.9146) ccw
  arc A8 (-3.1756, 6.1003) -> (-3.6952, 5.8003) centre (0, 0) ccw
  arc A9 (-3.6952, 5.8003) -> (-5.418, 7.0608) centre (-8.6799, 0.7952) ccw
  arc A10 (-5.418, 7.0608) -> (-6.0128, 6.5618) centre (0, 0) ccw
  arc A11 (-6.0128, 6.5618) -> (-5.0705, 4.6463) centre (0.7241, 8.6861) ccw
  arc A12 (-5.0705, 4.6463) -> (-5.4562, 4.1867) centre (0, 0) ccw
  arc A13 (-5.4562, 4.1867) -> (-7.5062, 4.782) centre (-8.4284, -2.2214) ccw
  arc A14 (-7.5062, 4.782) -> (-7.8944, 4.1096) centre (0, 0) ccw
  arc A15 (-7.8944, 4.1096) -> (-6.3539, 2.6319) centre (-2.2904, 8.4099) ccw
  arc A16 (-6.3539, 2.6319) -> (-6.5591, 2.0681) centre (0, 0) ccw
  arc A17 (-6.5591, 2.0681) -> (-8.689, 1.9263) centre (-7.1604, -4.9702) ccw
  arc A18 (-8.689, 1.9263) -> (-8.8239, 1.1617) centre (0, 0) ccw
  arc A19 (-8.8239, 1.1617) -> (-6.8708, 0.3) centre (-5.0286, 7.1194) ccw
  arc A20 (-6.8708, 0.3) -> (-6.8708, -0.3) centre (0, 0) ccw
  arc A21 (-6.8708, -0.3) -> (-8.8239, -1.1617) centre (-5.0286, -7.1194) ccw
  arc A22 (-8.8239, -1.1617) -> (-8.689, -1.9263) centre (0, 0) ccw
  arc A23 (-8.689, -1.9263) -> (-6.5591, -2.0681) centre (-7.1604, 4.9702) ccw
  arc A24 (-6.5591, -2.0681) -> (-6.3539, -2.6319) centre (0, 0) ccw
  arc A25 (-6.3539, -2.6319) -> (-7.8944, -4.1096) centre (-2.2904, -8.4099) ccw
  arc A26 (-7.8944, -4.1096) -> (-7.5062, -4.782) centre (0, 0) ccw
  arc A27 (-7.5062, -4.782) -> (-5.4562, -4.1867) centre (-8.4284, 2.2214) ccw
  arc A28 (-5.4562, -4.1867) -> (-5.0705, -4.6463) centre (0, 0) ccw
  arc A29 (-5.0705, -4.6463) -> (-6.0128, -6.5618) centre (0.7241, -8.6861) ccw
  arc A30 (-6.0128, -6.5618) -> (-5.418, -7.0608) centre (0, 0) ccw
  arc A31 (-5.418, -7.0608) -> (-3.6952, -5.8003) centre (-8.6799, -0.7952) ccw
  arc A32 (-3.6952, -5.8003) -> (-3.1756, -6.1003) centre (0, 0) ccw
  arc A33 (-3.1756, -6.1003) -> (-3.4059, -8.2225) centre (3.6513, -7.9146) ccw
  arc A34 (-3.4059, -8.2225) -> (-2.6763, -8.4881) centre (0, 0) ccw
  arc A35 (-2.6763, -8.4881) -> (-1.4885, -6.7144) centre (-7.8845, -3.716) ccw
  arc A36 (-1.4885, -6.7144) -> (-0.8977, -6.8185) centre (0, 0) ccw
  arc A37 (-0.8977, -6.8185) -> (-0.3882, -8.8915) centre (6.138, -6.1885) ccw
  arc A38 (-0.3882, -8.8915) -> (0.3882, -8.8915) centre (0, 0) ccw
  arc A39 (0.3882, -8.8915) -> (0.8977, -6.8185) centre (-6.138, -6.1885) ccw
  arc A40 (0.8977, -6.8185) -> (1.4885, -6.7144) centre (0, 0) ccw
  arc A41 (1.4885, -6.7144) -> (2.6763, -8.4881) centre (7.8845, -3.716) ccw
  arc A42 (2.6763, -8.4881) -> (3.4059, -8.2225) centre (0, 0) ccw
  arc A43 (3.4059, -8.2225) -> (3.1756, -6.1003) centre (-3.6513, -7.9146) ccw
  arc A44 (3.1756, -6.1003) -> (3.6952, -5.8003) centre (0, 0) ccw
  arc A45 (3.6952, -5.8003) -> (5.418, -7.0608) centre (8.6799, -0.7952) ccw
  arc A46 (5.418, -7.0608) -> (6.0128, -6.5618) centre (0, 0) ccw
  arc A47 (6.0128, -6.5618) -> (5.0705, -4.6463) centre (-0.7241, -8.6861) ccw
  arc A48 (5.0705, -4.6463) -> (5.4562, -4.1867) centre (0, 0) ccw
  arc A49 (5.4562, -4.1867) -> (7.5062, -4.782) centre (8.4284, 2.2214) ccw
  arc A50 (7.5062, -4.782) -> (7.8944, -4.1096) centre (0, 0) ccw
  arc A51 (7.8944, -4.1096) -> (6.3539, -2.6319) centre (2.2904, -8.4099) ccw
  arc A52 (6.3539, -2.6319) -> (6.5591, -2.0681) centre (0, 0) ccw
  arc A53 (6.5591, -2.0681) -> (8.689, -1.9263) centre (7.1604, 4.9702) ccw
  arc A54 (8.689, -1.9263) -> (8.8239, -1.1617) centre (0, 0) ccw
  arc A55 (8.8239, -1.1617) -> (6.8708, -0.3) centre (5.0286, -7.1194) ccw
  arc A56 (6.8708, -0.3) -> (6.8708, 0.3) centre (0, 0) ccw
  arc A57 (6.8708, 0.3) -> (8.8239, 1.1617) centre (5.0286, 7.1194) ccw
  arc A58 (8.8239, 1.1617) -> (8.689, 1.9263) centre (0, 0) ccw
  arc A59 (8.689, 1.9263) -> (6.5591, 2.0681) centre (7.1604, -4.9702) ccw
  arc A60 (6.5591, 2.0681) -> (6.3539, 2.6319) centre (0, 0) ccw
  arc A61 (6.3539, 2.6319) -> (7.8944, 4.1096) centre (2.2904, 8.4099) ccw
  arc A62 (7.8944, 4.1096) -> (7.5062, 4.782) centre (0, 0) ccw
  arc A63 (7.5062, 4.782) -> (5.4562, 4.1867) centre (8.4284, -2.2214) ccw
  arc A64 (5.4562, 4.1867) -> (5.0705, 4.6463) centre (0, 0) ccw
  arc A65 (5.0705, 4.6463) -> (6.0128, 6.5618) centre (-0.7241, 8.6861) ccw
  arc A66 (6.0128, 6.5618) -> (5.418, 7.0608) centre (0, 0) ccw
  arc A67 (5.418, 7.0608) -> (3.6952, 5.8003) centre (8.6799, 0.7952) ccw
  arc A68 (3.6952, 5.8003) -> (3.1756, 6.1003) centre (0, 0) ccw
  arc A69 (3.1756, 6.1003) -> (3.4059, 8.2225) centre (-3.6513, 7.9146) ccw
  arc A70 (3.4059, 8.2225) -> (2.6763, 8.4881) centre (0, 0) ccw
  arc A71 (2.6763, 8.4881) -> (1.4885, 6.7144) centre (7.8845, 3.716) ccw
  arc A72 (1.4885, 6.7144) -> (0.8977, 6.8185) centre (0, 0) ccw
  arc A73 (0.8977, 6.8185) -> (0.3882, 8.8915) centre (-6.138, 6.1885) ccw
  arc A74 (0.3882, 8.8915) -> (-0.3882, 8.8915) centre (0, 0) ccw
  arc A75 (-0.3882, 8.8915) -> (-0.8977, 6.8185) centre (6.138, 6.1885) ccw
  arc A76 (-0.8977, 6.8185) -> (-1.4885, 6.7144) centre (0, 0) ccw
  arc A77 (-1.4885, 6.7144) -> (-2.6763, 8.4881) centre (-7.8845, 3.716) ccw
  arc A78 (-2.6763, 8.4881) -> (-3.4059, 8.2225) centre (0, 0) ccw
  line L0 (-25, 25) -> (25, 25)
  line L1 (25, 25) -> (25, -25)
  circle A79 centre (0, 0) radius 10.4315
  dimension "d9" = 50
extrude "Выдавливание3" add sketch "Эскиз3" along normal blind 8 contours A78 A77 A76 A75 A74 A73 A72 A71 A70 A69 A68 A67 A66 A65 A64 A63 A62 A61 A60 A59 A58 A57 A56 A55 A54 A53 A52 A51 A50 A49 A48 A47 A46 A45 A44 A43 A42 A41 A40 A39 A38 A37 A36 A35 A34 A33 A32 A31 A30 A29 A28 A27 A26 A25 A24 A23 A22 A21 A20 A19 A18 A17 A16 A15 A14 A13 A12 A11 A10 A9 A8 A7 | A79
sketch "Эскиз5" plane through (0, 0, 0) normal (0, -1, 0) x (1, 0, 0)
  circle A0 centre (20, 28.5584) radius 2 projected
  circle A1 centre (-20, 25.9514) radius 2
  line L0 (25, 42.9514) -> (-25, 42.9514) projected
  point P0 (0, 0)
  dimension "d15" = 17
extrude "Выдавливание4" cut sketch "Эскиз5" against normal blind 12.25
move faces "Перенос1" translate (0, 0, -10) faces at (-8.3333, 1.3333, -25)
sketch "Эскиз6" plane through (0, 4, 0) normal (0, 1, 0) x (1, 0, 0)
  line L0 (25, 35) -> (-25, 35) projected
  line L1 (-25, 35) -> (-20, 35)
  line L2 (-20, 35) -> (-20, 40)
  line L3 (-20, 40) -> (-25, 40)
  line L4 (-25, 40) -> (-25, 35)
  line L5 (25, 35) -> (20, 35)
  line L6 (20, 35) -> (20, 40)
  line L7 (20, 40) -> (25, 40)
  line L8 (25, 40) -> (25, 35)
  point P0 (0, 0)
  dimension "d19" = 5
  dimension "d20" = 5
  dimension "d21" = 5
  dimension "d22" = 5
extrude "Выдавливание5" add sketch "Эскиз6" along normal blind 10 and the other way blind 4
properties part number "000.801 - Опора" material "Пластик АБС"
